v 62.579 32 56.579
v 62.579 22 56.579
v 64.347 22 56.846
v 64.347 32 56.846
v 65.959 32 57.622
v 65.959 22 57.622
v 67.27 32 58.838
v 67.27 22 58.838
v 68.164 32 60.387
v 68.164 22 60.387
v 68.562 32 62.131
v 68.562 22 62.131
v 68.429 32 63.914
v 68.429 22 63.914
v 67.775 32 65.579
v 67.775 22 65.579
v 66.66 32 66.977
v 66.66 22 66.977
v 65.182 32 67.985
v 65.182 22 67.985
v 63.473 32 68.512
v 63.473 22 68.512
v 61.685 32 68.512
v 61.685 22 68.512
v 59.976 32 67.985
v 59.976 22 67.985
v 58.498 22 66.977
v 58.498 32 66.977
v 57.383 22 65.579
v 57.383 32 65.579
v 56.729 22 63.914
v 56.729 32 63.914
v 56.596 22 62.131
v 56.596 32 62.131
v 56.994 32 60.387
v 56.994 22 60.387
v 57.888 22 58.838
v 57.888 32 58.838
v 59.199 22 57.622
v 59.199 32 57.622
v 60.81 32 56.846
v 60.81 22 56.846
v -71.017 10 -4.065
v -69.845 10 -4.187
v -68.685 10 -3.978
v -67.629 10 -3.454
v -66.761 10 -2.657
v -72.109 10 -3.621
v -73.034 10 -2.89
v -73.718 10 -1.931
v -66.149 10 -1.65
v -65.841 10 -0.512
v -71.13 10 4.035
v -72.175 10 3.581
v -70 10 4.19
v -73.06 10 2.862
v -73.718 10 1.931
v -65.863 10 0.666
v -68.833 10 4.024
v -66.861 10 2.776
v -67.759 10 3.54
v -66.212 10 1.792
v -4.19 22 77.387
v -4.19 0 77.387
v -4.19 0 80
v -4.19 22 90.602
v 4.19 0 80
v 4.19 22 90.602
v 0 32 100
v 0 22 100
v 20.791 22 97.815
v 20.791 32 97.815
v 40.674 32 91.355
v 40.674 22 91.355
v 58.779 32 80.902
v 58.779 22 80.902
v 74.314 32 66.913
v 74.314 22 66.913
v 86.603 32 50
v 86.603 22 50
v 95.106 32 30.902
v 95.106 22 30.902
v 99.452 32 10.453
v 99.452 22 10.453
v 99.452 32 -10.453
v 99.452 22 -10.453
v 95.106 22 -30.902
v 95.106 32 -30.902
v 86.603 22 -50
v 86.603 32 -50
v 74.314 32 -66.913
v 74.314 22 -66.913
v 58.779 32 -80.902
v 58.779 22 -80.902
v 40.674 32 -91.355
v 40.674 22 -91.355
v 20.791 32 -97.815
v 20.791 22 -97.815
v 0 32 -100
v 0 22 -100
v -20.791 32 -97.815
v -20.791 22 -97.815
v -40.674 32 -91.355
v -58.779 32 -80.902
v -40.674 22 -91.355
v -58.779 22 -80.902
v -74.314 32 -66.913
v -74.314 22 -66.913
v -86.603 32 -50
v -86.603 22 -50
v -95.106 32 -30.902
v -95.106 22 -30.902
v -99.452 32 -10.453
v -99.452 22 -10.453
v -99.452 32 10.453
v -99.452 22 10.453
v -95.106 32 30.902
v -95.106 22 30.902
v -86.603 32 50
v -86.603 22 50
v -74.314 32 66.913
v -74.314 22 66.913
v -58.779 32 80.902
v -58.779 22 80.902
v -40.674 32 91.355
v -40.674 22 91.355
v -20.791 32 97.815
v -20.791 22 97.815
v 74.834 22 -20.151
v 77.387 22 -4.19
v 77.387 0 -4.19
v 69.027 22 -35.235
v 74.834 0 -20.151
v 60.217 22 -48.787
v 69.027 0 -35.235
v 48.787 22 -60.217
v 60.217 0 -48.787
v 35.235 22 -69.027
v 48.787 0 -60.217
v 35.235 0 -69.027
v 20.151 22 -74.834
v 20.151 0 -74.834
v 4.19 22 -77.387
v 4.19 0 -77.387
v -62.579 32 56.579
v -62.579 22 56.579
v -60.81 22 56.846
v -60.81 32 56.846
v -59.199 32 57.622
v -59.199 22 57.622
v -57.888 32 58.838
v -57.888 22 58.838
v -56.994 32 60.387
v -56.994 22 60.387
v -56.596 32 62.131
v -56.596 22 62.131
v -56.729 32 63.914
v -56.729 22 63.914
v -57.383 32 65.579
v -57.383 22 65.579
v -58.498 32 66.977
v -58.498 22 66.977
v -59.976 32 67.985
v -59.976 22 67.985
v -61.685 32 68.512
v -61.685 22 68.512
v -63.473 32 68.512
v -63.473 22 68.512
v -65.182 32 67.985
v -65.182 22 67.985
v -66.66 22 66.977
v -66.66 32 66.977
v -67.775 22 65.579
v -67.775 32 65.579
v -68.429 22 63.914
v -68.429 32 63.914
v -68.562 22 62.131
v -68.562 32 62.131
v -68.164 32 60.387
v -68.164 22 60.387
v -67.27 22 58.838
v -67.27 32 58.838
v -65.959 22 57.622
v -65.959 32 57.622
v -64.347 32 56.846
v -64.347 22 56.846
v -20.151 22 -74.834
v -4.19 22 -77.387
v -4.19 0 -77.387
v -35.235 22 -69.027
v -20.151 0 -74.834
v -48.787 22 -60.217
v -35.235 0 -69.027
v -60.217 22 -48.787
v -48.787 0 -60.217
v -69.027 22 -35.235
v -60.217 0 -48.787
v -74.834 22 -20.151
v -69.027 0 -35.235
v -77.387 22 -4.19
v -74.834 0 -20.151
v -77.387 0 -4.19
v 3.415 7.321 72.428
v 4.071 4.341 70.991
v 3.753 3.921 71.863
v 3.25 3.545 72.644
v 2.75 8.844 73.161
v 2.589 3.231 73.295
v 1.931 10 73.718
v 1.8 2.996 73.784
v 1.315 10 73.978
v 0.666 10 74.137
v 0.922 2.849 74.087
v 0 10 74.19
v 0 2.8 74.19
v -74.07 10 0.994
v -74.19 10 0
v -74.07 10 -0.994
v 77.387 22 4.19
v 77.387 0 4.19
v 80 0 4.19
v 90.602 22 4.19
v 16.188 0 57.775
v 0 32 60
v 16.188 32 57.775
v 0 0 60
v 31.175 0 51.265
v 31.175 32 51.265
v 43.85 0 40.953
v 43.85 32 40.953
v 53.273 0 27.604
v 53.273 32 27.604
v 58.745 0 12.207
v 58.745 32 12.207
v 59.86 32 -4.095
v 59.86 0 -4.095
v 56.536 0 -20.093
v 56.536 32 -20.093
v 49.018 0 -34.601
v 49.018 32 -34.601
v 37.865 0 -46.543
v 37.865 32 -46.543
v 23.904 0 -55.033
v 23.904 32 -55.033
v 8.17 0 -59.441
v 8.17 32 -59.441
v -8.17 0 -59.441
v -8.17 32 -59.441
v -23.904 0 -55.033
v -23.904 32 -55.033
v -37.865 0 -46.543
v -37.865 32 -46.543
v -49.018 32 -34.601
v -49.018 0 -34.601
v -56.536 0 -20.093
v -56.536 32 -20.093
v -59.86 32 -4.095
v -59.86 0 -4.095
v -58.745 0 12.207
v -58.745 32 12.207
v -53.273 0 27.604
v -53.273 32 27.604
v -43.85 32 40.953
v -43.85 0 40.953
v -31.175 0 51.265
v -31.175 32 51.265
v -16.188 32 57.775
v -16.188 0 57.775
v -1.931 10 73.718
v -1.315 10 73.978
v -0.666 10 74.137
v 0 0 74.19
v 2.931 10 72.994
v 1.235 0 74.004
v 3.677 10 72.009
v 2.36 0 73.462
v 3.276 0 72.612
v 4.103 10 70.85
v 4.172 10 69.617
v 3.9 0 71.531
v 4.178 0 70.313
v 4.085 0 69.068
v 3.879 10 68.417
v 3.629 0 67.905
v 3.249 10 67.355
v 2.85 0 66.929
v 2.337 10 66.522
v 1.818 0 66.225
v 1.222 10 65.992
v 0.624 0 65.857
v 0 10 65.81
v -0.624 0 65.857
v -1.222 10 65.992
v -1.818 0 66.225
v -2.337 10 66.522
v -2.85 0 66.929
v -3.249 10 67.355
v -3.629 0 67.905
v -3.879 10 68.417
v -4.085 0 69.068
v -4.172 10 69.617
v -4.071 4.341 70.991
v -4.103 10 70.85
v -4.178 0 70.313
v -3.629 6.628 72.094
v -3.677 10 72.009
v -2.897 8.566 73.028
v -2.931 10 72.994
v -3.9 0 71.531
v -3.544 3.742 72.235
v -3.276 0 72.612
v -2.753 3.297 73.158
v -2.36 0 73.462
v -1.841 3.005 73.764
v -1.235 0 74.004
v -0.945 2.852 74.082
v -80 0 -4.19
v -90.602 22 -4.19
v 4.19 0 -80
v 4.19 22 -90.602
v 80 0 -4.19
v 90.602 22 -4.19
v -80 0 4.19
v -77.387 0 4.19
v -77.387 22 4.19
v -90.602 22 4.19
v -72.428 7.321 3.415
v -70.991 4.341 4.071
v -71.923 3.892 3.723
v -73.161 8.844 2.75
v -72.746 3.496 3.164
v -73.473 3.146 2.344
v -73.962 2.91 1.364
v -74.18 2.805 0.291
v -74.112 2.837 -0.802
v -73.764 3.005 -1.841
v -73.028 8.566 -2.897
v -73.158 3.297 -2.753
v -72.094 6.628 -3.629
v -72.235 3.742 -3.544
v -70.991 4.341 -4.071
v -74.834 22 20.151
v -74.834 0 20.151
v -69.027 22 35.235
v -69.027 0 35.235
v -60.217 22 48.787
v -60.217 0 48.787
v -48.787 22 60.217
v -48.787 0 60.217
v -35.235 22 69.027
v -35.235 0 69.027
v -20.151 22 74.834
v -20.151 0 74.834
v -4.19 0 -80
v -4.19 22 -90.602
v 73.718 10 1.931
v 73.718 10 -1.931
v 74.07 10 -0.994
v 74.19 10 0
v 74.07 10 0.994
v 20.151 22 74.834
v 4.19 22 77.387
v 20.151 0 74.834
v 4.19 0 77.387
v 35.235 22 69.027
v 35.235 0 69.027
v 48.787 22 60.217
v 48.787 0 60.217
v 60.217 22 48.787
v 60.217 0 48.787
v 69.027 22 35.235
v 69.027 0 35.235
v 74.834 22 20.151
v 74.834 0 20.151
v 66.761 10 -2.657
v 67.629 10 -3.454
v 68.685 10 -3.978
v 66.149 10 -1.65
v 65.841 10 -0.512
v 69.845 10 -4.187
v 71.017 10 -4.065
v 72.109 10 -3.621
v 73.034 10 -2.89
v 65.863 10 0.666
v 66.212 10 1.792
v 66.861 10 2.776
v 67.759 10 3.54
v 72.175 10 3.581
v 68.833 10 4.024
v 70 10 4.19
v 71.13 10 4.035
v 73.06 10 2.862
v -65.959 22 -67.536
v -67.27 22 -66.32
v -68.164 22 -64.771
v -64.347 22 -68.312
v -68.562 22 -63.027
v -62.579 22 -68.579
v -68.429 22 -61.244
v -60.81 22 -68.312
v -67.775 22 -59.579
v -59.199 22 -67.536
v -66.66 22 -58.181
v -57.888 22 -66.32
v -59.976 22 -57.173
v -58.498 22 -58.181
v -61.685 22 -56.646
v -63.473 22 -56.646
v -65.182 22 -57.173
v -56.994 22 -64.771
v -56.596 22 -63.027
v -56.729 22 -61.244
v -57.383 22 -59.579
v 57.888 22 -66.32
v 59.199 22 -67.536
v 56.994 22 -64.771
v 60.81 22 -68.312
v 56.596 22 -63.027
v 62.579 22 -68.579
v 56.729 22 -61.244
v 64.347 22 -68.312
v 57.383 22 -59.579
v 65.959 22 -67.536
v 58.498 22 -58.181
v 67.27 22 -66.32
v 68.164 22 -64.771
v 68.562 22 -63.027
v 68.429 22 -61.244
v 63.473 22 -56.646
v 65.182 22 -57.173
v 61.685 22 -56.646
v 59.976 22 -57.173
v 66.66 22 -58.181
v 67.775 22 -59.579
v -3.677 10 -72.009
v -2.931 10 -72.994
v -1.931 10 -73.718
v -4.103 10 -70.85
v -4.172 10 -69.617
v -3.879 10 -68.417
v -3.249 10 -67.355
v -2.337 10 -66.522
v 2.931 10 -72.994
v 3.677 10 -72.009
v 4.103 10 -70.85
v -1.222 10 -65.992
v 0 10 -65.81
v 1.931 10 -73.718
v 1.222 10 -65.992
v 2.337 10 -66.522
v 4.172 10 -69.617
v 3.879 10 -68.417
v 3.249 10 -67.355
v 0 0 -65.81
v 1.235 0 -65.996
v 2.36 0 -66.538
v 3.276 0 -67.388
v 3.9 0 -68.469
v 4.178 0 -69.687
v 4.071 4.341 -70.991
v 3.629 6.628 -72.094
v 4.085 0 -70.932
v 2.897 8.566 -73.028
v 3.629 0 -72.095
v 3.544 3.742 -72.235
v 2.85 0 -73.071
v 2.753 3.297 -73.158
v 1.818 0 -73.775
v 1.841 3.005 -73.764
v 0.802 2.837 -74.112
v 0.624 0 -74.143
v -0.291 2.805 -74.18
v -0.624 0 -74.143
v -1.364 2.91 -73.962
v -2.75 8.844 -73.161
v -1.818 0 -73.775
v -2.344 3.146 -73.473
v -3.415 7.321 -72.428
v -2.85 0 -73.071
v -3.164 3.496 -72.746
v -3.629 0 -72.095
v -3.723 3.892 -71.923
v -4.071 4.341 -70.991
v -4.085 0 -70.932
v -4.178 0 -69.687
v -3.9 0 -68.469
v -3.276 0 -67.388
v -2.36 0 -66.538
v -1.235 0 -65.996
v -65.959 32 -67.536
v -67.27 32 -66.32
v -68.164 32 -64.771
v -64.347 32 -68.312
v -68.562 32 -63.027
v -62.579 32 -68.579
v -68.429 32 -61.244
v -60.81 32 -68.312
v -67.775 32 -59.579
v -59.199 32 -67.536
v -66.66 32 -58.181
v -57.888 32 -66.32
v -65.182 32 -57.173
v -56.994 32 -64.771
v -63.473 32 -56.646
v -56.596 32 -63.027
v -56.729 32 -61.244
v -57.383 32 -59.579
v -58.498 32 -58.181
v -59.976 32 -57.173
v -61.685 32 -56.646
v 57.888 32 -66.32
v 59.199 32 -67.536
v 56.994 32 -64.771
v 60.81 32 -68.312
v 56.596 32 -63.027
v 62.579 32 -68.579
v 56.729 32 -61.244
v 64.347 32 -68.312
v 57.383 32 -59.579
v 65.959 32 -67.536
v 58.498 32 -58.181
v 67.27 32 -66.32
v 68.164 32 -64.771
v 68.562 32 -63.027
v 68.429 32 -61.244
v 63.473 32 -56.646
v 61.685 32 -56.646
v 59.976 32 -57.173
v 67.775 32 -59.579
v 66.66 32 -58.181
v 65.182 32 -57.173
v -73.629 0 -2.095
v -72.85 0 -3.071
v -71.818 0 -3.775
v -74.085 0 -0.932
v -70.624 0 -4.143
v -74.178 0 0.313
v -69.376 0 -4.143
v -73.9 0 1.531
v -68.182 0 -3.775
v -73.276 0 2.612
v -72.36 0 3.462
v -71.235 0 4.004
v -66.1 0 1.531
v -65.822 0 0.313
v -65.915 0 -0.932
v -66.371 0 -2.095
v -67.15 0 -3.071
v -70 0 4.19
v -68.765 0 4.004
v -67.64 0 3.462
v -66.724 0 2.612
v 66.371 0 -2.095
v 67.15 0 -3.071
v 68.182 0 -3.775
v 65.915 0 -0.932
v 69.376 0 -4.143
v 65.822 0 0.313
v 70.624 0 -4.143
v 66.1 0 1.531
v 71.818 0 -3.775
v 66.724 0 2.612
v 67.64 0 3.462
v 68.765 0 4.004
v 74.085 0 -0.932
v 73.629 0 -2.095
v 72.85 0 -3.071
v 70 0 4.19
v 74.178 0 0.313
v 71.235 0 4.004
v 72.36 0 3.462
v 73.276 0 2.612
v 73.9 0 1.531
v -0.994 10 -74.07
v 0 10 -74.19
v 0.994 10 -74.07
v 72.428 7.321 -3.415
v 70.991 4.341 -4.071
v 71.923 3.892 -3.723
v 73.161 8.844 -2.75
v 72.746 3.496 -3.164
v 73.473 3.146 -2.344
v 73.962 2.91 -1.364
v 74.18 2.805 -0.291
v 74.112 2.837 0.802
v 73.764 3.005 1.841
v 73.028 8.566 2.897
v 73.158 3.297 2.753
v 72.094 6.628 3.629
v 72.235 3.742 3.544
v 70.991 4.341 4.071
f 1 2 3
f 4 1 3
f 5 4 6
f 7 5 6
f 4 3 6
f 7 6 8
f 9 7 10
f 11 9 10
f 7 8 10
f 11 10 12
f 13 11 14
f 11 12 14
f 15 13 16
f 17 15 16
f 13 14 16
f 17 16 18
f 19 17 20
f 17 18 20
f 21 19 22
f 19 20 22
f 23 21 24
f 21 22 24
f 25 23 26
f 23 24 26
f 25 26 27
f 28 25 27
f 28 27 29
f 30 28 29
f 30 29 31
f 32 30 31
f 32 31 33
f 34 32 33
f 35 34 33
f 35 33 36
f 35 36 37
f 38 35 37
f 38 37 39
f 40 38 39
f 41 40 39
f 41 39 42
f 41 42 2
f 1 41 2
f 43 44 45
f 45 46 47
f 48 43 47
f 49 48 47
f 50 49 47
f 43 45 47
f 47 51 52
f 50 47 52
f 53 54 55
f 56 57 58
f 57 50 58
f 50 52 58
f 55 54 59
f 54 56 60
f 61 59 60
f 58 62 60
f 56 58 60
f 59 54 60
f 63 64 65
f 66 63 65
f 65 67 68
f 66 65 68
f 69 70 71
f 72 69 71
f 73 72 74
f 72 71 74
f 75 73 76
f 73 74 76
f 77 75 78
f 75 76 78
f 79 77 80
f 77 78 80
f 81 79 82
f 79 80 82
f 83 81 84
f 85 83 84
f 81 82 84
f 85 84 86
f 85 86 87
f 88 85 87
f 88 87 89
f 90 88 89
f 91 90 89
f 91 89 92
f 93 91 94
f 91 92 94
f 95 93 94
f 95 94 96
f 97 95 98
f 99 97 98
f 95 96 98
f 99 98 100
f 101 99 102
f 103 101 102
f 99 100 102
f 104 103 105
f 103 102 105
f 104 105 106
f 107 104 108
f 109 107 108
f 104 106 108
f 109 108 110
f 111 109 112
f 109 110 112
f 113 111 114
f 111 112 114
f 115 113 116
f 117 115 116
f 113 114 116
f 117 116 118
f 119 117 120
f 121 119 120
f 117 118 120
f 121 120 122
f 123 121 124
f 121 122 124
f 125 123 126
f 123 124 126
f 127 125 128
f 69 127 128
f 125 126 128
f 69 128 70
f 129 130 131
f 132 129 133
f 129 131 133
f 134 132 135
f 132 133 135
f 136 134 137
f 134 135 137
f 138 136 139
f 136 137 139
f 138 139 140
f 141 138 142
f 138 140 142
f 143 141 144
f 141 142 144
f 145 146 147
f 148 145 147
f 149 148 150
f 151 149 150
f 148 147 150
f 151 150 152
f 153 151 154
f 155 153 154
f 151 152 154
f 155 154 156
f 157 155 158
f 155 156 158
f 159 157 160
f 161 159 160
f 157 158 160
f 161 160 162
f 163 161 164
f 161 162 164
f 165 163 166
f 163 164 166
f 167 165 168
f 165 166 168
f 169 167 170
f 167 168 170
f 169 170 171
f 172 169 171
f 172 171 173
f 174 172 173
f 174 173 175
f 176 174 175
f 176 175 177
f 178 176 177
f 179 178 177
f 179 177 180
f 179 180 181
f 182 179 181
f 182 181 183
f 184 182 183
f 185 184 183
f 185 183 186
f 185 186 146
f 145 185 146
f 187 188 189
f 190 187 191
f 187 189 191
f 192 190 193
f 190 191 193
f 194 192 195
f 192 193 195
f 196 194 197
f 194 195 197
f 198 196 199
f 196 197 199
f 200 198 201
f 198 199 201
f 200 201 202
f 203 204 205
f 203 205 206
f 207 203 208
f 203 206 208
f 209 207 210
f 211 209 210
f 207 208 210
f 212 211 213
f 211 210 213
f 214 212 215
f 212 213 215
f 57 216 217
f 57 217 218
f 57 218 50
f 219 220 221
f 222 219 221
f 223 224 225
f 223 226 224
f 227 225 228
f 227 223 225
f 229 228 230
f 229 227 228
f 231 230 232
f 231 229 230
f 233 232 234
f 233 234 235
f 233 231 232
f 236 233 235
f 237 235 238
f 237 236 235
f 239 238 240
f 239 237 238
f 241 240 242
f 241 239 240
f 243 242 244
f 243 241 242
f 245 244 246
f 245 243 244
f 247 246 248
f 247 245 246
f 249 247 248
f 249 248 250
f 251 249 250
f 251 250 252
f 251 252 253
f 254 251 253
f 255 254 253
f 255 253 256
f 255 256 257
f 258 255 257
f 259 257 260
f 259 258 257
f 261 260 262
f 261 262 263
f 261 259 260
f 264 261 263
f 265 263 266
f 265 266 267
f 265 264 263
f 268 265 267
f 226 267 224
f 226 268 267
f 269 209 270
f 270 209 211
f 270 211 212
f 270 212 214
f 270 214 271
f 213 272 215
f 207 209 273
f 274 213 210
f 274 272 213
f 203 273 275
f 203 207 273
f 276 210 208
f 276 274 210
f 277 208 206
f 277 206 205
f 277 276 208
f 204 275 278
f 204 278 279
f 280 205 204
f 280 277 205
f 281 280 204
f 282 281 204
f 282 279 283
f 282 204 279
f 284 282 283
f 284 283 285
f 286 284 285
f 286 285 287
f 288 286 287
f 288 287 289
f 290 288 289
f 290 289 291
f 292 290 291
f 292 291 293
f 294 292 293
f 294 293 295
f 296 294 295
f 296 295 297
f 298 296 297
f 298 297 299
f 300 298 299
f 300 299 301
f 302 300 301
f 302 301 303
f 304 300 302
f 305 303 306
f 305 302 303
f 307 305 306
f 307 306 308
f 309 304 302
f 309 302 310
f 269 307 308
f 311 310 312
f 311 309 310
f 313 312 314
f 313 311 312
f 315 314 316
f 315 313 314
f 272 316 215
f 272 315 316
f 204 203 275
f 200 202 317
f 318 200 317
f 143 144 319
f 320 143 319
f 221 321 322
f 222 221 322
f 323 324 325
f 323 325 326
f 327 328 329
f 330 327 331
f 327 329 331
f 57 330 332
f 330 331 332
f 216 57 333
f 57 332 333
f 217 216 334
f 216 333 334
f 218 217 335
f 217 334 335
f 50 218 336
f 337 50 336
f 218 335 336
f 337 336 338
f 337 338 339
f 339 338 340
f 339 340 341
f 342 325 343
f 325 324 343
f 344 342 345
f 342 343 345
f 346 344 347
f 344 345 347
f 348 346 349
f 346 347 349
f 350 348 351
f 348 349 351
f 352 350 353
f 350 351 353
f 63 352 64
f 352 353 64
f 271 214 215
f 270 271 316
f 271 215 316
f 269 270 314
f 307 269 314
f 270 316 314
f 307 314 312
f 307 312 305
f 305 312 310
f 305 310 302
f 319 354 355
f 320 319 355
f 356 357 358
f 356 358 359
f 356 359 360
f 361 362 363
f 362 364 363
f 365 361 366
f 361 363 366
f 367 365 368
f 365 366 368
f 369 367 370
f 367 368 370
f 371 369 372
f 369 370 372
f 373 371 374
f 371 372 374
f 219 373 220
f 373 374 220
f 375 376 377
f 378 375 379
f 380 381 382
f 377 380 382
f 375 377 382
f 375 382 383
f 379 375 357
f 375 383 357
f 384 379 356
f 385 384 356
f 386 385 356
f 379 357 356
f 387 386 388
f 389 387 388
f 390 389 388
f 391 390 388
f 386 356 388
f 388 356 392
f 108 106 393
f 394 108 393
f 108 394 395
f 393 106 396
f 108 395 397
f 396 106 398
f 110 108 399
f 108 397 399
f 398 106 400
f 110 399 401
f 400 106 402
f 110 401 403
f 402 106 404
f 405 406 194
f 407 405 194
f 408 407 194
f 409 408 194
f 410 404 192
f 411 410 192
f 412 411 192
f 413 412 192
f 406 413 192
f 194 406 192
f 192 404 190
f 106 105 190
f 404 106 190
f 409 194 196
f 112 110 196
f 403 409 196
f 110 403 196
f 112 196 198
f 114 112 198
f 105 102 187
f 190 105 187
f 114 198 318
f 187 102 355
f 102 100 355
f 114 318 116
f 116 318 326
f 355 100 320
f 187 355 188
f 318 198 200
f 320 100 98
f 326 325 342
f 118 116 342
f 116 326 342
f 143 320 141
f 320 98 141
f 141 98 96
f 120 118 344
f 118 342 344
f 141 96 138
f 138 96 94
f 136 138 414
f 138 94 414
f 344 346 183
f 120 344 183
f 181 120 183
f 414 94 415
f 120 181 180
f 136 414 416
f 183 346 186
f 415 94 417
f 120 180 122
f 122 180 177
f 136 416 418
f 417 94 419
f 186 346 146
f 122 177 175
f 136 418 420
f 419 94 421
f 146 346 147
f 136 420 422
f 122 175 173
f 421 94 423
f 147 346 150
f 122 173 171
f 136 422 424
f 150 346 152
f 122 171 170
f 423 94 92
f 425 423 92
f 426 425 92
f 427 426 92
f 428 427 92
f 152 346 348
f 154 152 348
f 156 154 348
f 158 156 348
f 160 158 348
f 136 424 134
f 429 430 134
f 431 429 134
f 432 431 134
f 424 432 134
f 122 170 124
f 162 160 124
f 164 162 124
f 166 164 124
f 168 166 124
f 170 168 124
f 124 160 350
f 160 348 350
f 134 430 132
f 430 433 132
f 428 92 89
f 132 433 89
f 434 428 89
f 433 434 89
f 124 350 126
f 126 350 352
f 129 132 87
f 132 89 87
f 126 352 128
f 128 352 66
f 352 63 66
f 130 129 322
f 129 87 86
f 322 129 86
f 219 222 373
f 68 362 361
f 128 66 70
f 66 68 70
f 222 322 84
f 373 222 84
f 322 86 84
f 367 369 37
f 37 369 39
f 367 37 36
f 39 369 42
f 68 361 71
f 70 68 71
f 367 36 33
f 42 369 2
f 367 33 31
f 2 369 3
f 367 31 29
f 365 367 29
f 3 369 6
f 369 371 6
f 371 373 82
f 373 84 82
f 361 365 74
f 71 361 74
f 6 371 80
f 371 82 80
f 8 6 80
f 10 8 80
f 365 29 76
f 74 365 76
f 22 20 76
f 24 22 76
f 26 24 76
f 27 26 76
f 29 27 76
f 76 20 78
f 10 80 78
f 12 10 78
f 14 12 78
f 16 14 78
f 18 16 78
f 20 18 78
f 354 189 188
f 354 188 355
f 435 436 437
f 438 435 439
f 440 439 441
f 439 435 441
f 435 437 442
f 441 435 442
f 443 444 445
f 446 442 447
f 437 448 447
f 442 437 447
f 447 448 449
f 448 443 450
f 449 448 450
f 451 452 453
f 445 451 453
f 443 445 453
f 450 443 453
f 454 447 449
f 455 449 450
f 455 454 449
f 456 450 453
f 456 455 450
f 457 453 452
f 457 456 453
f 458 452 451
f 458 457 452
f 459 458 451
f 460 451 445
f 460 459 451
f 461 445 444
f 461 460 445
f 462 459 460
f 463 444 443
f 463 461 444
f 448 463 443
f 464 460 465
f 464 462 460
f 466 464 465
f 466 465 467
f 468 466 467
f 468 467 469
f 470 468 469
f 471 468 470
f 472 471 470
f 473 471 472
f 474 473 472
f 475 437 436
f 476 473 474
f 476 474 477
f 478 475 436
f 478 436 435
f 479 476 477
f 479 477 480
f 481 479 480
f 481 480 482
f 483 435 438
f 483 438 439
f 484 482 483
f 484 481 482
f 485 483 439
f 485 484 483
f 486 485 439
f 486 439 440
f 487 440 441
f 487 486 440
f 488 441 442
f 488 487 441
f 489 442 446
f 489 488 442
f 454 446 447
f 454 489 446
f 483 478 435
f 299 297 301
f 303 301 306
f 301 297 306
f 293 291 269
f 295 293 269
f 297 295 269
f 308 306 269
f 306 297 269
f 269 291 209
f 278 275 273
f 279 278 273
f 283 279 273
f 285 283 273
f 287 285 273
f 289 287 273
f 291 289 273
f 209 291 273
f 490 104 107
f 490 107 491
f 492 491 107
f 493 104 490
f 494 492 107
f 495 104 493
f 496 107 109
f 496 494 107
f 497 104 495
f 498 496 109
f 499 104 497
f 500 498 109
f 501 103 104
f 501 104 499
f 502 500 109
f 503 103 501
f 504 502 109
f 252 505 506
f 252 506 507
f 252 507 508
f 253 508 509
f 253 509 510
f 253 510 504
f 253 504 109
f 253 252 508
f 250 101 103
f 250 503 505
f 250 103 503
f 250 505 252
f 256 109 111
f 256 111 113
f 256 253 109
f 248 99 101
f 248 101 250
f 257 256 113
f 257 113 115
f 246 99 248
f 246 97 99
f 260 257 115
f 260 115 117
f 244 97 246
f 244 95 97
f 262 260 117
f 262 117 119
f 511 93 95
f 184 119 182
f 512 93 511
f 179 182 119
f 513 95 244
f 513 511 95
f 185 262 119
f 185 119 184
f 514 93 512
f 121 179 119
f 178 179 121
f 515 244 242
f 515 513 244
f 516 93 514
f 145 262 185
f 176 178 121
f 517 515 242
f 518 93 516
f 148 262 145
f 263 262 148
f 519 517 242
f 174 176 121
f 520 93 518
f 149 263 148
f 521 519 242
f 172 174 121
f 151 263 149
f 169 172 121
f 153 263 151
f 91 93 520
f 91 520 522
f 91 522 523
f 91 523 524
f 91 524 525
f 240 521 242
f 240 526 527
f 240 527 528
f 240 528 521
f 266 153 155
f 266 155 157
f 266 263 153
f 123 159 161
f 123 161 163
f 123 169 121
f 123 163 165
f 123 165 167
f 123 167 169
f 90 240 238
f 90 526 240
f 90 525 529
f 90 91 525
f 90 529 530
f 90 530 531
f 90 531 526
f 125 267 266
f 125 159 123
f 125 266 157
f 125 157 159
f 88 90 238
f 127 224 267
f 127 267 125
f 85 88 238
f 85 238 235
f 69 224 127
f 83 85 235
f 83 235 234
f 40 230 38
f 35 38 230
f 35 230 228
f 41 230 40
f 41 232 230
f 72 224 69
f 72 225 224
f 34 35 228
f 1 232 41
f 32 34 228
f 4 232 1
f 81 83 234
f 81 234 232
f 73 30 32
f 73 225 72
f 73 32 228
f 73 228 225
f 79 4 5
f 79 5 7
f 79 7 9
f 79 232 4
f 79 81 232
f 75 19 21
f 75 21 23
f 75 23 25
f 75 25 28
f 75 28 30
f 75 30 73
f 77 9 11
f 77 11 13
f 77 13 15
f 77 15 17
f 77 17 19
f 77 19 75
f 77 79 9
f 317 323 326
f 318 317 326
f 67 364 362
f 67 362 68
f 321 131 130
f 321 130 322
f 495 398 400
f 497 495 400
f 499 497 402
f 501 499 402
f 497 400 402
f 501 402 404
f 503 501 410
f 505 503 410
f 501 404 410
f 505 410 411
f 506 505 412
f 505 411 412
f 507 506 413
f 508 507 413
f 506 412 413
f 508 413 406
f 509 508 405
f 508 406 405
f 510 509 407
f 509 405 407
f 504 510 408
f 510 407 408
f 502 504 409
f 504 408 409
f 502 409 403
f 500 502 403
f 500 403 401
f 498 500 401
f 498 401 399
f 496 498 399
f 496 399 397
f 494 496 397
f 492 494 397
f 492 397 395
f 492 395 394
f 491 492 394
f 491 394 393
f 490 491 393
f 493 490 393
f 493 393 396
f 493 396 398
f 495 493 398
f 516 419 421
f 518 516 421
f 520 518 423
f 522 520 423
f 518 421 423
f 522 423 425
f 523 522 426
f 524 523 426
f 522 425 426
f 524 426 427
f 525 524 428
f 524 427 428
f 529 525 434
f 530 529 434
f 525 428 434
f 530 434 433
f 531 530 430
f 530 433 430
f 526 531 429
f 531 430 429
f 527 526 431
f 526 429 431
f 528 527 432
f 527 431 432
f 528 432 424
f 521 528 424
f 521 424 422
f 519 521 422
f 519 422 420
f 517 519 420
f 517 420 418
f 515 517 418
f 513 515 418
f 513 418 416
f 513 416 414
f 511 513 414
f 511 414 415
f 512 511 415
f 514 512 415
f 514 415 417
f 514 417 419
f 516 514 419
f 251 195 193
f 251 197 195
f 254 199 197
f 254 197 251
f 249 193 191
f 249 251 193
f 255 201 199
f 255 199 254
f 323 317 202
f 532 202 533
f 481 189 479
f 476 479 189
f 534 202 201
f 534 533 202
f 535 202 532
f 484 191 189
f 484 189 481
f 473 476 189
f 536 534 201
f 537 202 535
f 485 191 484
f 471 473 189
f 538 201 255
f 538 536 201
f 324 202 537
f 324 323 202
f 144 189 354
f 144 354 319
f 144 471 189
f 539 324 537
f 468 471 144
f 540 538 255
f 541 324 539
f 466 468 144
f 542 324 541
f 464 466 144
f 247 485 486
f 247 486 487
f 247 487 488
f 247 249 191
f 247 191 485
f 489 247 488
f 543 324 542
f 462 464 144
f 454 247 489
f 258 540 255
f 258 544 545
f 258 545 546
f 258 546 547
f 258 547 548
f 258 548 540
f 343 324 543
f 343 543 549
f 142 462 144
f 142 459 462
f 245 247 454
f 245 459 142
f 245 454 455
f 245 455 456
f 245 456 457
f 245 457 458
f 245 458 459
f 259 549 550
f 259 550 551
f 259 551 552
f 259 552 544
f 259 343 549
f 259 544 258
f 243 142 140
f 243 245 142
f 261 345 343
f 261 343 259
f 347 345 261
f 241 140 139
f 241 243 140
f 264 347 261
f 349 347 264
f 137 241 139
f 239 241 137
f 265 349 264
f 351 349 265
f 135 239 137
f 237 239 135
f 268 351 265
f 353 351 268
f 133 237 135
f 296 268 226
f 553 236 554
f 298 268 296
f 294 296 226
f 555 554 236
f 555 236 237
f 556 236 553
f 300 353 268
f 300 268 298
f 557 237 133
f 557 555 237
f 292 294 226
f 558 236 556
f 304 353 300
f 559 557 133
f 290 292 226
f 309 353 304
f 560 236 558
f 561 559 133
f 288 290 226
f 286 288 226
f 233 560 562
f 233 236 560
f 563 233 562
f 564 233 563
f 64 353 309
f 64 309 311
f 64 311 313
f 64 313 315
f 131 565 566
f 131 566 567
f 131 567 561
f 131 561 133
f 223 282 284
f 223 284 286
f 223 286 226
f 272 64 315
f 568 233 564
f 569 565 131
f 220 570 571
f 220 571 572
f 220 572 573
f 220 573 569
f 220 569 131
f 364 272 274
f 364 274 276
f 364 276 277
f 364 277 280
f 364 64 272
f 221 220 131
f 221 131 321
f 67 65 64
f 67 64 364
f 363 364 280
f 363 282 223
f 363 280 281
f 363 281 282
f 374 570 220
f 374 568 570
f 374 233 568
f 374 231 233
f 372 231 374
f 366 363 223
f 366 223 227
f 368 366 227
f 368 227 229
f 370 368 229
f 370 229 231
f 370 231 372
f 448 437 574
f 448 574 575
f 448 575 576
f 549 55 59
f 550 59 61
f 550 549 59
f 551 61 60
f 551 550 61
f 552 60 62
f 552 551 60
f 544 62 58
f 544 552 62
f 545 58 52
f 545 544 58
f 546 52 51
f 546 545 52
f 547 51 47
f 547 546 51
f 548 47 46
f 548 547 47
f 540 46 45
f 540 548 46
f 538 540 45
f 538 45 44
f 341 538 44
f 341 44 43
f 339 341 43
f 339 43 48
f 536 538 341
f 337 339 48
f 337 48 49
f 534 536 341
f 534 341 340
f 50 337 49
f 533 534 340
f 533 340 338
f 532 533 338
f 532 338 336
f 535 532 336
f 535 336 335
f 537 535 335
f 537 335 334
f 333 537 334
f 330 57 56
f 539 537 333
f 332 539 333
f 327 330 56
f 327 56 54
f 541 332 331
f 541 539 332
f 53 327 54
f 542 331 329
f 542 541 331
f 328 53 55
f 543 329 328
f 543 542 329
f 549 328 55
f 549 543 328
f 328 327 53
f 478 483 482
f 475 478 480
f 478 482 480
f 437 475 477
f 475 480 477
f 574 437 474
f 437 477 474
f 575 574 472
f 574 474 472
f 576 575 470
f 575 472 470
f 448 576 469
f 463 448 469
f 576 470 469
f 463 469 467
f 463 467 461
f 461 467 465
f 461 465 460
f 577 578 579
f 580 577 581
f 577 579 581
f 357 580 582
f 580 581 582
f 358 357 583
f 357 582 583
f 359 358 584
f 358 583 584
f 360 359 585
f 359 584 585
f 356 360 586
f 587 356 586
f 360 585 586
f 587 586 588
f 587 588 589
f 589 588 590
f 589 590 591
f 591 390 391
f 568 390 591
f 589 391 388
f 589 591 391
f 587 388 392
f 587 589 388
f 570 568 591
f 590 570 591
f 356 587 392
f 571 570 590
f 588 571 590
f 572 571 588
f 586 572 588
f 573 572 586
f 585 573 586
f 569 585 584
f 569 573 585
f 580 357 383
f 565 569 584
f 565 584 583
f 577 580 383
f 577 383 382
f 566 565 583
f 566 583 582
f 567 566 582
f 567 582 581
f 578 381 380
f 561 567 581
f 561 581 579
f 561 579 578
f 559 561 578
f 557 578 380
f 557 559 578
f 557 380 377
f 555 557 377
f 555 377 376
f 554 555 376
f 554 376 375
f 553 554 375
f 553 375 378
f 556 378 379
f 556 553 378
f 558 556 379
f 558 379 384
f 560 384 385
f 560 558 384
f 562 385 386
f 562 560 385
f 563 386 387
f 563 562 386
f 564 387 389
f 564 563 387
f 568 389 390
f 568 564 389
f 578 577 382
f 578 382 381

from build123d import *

# Parameters (mm, degrees)
IZIM1_R                          = 77.5
IZIM1_R_2                        = 60
IZIM1_R_3                        = 4.19
Y_KSEKLIK_EKSTR_ZYON1_DEPTH      = 10
IZIM2_R                          = 77.5
IZIM2_R_2                        = 60
Y_KSEKLIK_EKSTR_ZYON2_DEPTH      = 22
Y_KSEKLIK_EKSTR_ZYON3_START      = -10
IZIM3_R                          = 100
IZIM3_R_2                        = 60
Y_KSEKLIK_EKSTR_ZYON3_DEPTH      = 10
Y_KSEKLIK_EKSTR_ZYON4_REACH      = 210.384
Y_KSEKLIK_EKSTR_ZYON4_END_RADIUS = 77.5
IZIM5_W                          = 8.38
IZIM5_H                          = 22
DAIRESEL_KAPLAMA1_COUNT          = 4
EKSTR_ZYON_NCE4_DEPTH            = 4.19
DAIRESEL_KAPLAMA2_COUNT          = 4
IZIM7_R                          = 4.19
KES_EKSTR_ZYON1_DEPTH            = 10
IZIM8_R                          = 6
KES_EKSTR_ZYON2_DEPTH            = 144.122325303


with BuildPart() as part:
    # Çizim1 → Yükseklik-Ekstrüzyon1 (new body)
    with BuildSketch(Plane(origin=(0, 0, 0), x_dir=(1, 0, 0), z_dir=(0, 1, 0))):
        with Locations(Location((0, 0, 0), (0, 0, 270))):
            Circle(IZIM1_R)
        with Locations(Location((0, 0, 0), (0, 0, 270))):
            Circle(IZIM1_R_2, mode=Mode.SUBTRACT)
        with Locations(Location((0, 70, 0), (0, 0, 270))):
            Circle(IZIM1_R_3, mode=Mode.SUBTRACT)
        with Locations(Location((70, 0, 0), (0, 0, 270))):
            Circle(IZIM1_R_3, mode=Mode.SUBTRACT)
        with Locations(Location((0, -70, 0), (0, 0, 270))):
            Circle(IZIM1_R_3, mode=Mode.SUBTRACT)
        with Locations(Location((-70, 0, 0), (0, 0, 270))):
            Circle(IZIM1_R_3, mode=Mode.SUBTRACT)
    extrude(amount=Y_KSEKLIK_EKSTR_ZYON1_DEPTH)

    # Çizim2 → Yükseklik-Ekstrüzyon2 (add)
    with BuildSketch(Plane(origin=(0, 10, 0), x_dir=(1, 0, 0), z_dir=(0, 1, 0))):
        with Locations(Location((0, 0, 0), (0, 0, 270))):
            Circle(IZIM2_R)
        with Locations(Location((0, 0, 0), (0, 0, 270))):
            Circle(IZIM2_R_2, mode=Mode.SUBTRACT)
    extrude(amount=Y_KSEKLIK_EKSTR_ZYON2_DEPTH)

    # Çizim3 → Yükseklik-Ekstrüzyon3 (add)
    with BuildSketch(Plane(origin=(0, 32, 0), x_dir=(1, 0, 0), z_dir=(0, 1, 0)).offset(Y_KSEKLIK_EKSTR_ZYON3_START)):
        with Locations(Location((0, 0, 0), (0, 0, 270))):
            Circle(IZIM3_R)
        with Locations(Location((0, 0, 0), (0, 0, 270))):
            Circle(IZIM3_R_2, mode=Mode.SUBTRACT)
    extrude(amount=Y_KSEKLIK_EKSTR_ZYON3_DEPTH)

    # Yükseklik-Ekstrüzyon4: up to this cylinder (the profile starts outside it)
    y_kseklik_ekstr_zyon4_end = Plane(origin=(0, 11, 0), z_dir=(0, -1, 0)) * Cylinder(Y_KSEKLIK_EKSTR_ZYON4_END_RADIUS, 576.768, mode=Mode.PRIVATE)
    # Çizim5 → Yükseklik-Ekstrüzyon4 (add, up to the surface)
    with BuildSketch(Plane.XY.offset(80), mode=Mode.PRIVATE) as y_kseklik_ekstr_zyon4_sk1:
        with Locations((0, 11)):
            Rectangle(IZIM5_W, IZIM5_H)
    y_kseklik_ekstr_zyon4_tool1 = extrude(y_kseklik_ekstr_zyon4_sk1.sketch, amount=-Y_KSEKLIK_EKSTR_ZYON4_REACH, mode=Mode.PRIVATE) - y_kseklik_ekstr_zyon4_end
    y_kseklik_ekstr_zyon4 = y_kseklik_ekstr_zyon4_tool1.solids().sort_by_distance((0, 11, 80))[0]
    add(y_kseklik_ekstr_zyon4)

    # Dairesel Kaplama1: Yükseklik-Ekstrüzyon4 ×4 about axis
    dairesel_kaplama1_axis = Axis((0, 0, 0), (0, 1, 0))
    for i in range(1, DAIRESEL_KAPLAMA1_COUNT):
        add(y_kseklik_ekstr_zyon4.rotate(dairesel_kaplama1_axis, i * 360 / DAIRESEL_KAPLAMA1_COUNT))

    # Çizim6 → Ekstrüzyon-İnce4 (add, symmetric)
    with BuildSketch(Plane(origin=(0, 0, 0), x_dir=(0, 0, -1), z_dir=(1, 0, 0))):
        Polygon((-80, 0), (-90.601909395, 22), (-81.593384405, 26.341252988), (-70.99147501, 4.341252988), align=None)
    ekstr_zyon_nce4 = extrude(amount=EKSTR_ZYON_NCE4_DEPTH, both=True)

    # Dairesel Kaplama2: Ekstrüzyon-İnce4 ×4 about axis
    dairesel_kaplama2_axis = Axis((0, 0, 0), (0, 1, 0))
    for i in range(1, DAIRESEL_KAPLAMA2_COUNT):
        add(ekstr_zyon_nce4.rotate(dairesel_kaplama2_axis, i * 360 / DAIRESEL_KAPLAMA2_COUNT))

    # Çizim7 → Kes-Ekstrüzyon1 (cut)
    with BuildSketch(Plane.XZ):
        with Locations(Location((70, 0, 0), (0, 0, 90))):
            Circle(IZIM7_R)
        with Locations(Location((0, -70, 0), (0, 0, 90))):
            Circle(IZIM7_R)
        with Locations(Location((-70, 0, 0), (0, 0, 90))):
            Circle(IZIM7_R)
        with Locations(Location((0, 70, 0), (0, 0, 90))):
            Circle(IZIM7_R)
    extrude(amount=-KES_EKSTR_ZYON1_DEPTH, mode=Mode.SUBTRACT)

    # Çizim8 → Kes-Ekstrüzyon2 (cut, through all)
    with BuildSketch(Plane.XZ.offset(-22)):
        with Locations(Location((62.578950135, -62.578950135, 0), (0, 0, 270))):
            Circle(IZIM8_R)
        with Locations(Location((-62.578950135, -62.578950135, 0), (0, 0, 270))):
            Circle(IZIM8_R)
        with Locations(Location((-62.578950135, 62.578950135, 0), (0, 0, 270))):
            Circle(IZIM8_R)
        with Locations(Location((62.578950135, 62.578950135, 0), (0, 0, 270))):
            Circle(IZIM8_R)
    extrude(amount=-KES_EKSTR_ZYON2_DEPTH, mode=Mode.SUBTRACT)


solid = part.part
